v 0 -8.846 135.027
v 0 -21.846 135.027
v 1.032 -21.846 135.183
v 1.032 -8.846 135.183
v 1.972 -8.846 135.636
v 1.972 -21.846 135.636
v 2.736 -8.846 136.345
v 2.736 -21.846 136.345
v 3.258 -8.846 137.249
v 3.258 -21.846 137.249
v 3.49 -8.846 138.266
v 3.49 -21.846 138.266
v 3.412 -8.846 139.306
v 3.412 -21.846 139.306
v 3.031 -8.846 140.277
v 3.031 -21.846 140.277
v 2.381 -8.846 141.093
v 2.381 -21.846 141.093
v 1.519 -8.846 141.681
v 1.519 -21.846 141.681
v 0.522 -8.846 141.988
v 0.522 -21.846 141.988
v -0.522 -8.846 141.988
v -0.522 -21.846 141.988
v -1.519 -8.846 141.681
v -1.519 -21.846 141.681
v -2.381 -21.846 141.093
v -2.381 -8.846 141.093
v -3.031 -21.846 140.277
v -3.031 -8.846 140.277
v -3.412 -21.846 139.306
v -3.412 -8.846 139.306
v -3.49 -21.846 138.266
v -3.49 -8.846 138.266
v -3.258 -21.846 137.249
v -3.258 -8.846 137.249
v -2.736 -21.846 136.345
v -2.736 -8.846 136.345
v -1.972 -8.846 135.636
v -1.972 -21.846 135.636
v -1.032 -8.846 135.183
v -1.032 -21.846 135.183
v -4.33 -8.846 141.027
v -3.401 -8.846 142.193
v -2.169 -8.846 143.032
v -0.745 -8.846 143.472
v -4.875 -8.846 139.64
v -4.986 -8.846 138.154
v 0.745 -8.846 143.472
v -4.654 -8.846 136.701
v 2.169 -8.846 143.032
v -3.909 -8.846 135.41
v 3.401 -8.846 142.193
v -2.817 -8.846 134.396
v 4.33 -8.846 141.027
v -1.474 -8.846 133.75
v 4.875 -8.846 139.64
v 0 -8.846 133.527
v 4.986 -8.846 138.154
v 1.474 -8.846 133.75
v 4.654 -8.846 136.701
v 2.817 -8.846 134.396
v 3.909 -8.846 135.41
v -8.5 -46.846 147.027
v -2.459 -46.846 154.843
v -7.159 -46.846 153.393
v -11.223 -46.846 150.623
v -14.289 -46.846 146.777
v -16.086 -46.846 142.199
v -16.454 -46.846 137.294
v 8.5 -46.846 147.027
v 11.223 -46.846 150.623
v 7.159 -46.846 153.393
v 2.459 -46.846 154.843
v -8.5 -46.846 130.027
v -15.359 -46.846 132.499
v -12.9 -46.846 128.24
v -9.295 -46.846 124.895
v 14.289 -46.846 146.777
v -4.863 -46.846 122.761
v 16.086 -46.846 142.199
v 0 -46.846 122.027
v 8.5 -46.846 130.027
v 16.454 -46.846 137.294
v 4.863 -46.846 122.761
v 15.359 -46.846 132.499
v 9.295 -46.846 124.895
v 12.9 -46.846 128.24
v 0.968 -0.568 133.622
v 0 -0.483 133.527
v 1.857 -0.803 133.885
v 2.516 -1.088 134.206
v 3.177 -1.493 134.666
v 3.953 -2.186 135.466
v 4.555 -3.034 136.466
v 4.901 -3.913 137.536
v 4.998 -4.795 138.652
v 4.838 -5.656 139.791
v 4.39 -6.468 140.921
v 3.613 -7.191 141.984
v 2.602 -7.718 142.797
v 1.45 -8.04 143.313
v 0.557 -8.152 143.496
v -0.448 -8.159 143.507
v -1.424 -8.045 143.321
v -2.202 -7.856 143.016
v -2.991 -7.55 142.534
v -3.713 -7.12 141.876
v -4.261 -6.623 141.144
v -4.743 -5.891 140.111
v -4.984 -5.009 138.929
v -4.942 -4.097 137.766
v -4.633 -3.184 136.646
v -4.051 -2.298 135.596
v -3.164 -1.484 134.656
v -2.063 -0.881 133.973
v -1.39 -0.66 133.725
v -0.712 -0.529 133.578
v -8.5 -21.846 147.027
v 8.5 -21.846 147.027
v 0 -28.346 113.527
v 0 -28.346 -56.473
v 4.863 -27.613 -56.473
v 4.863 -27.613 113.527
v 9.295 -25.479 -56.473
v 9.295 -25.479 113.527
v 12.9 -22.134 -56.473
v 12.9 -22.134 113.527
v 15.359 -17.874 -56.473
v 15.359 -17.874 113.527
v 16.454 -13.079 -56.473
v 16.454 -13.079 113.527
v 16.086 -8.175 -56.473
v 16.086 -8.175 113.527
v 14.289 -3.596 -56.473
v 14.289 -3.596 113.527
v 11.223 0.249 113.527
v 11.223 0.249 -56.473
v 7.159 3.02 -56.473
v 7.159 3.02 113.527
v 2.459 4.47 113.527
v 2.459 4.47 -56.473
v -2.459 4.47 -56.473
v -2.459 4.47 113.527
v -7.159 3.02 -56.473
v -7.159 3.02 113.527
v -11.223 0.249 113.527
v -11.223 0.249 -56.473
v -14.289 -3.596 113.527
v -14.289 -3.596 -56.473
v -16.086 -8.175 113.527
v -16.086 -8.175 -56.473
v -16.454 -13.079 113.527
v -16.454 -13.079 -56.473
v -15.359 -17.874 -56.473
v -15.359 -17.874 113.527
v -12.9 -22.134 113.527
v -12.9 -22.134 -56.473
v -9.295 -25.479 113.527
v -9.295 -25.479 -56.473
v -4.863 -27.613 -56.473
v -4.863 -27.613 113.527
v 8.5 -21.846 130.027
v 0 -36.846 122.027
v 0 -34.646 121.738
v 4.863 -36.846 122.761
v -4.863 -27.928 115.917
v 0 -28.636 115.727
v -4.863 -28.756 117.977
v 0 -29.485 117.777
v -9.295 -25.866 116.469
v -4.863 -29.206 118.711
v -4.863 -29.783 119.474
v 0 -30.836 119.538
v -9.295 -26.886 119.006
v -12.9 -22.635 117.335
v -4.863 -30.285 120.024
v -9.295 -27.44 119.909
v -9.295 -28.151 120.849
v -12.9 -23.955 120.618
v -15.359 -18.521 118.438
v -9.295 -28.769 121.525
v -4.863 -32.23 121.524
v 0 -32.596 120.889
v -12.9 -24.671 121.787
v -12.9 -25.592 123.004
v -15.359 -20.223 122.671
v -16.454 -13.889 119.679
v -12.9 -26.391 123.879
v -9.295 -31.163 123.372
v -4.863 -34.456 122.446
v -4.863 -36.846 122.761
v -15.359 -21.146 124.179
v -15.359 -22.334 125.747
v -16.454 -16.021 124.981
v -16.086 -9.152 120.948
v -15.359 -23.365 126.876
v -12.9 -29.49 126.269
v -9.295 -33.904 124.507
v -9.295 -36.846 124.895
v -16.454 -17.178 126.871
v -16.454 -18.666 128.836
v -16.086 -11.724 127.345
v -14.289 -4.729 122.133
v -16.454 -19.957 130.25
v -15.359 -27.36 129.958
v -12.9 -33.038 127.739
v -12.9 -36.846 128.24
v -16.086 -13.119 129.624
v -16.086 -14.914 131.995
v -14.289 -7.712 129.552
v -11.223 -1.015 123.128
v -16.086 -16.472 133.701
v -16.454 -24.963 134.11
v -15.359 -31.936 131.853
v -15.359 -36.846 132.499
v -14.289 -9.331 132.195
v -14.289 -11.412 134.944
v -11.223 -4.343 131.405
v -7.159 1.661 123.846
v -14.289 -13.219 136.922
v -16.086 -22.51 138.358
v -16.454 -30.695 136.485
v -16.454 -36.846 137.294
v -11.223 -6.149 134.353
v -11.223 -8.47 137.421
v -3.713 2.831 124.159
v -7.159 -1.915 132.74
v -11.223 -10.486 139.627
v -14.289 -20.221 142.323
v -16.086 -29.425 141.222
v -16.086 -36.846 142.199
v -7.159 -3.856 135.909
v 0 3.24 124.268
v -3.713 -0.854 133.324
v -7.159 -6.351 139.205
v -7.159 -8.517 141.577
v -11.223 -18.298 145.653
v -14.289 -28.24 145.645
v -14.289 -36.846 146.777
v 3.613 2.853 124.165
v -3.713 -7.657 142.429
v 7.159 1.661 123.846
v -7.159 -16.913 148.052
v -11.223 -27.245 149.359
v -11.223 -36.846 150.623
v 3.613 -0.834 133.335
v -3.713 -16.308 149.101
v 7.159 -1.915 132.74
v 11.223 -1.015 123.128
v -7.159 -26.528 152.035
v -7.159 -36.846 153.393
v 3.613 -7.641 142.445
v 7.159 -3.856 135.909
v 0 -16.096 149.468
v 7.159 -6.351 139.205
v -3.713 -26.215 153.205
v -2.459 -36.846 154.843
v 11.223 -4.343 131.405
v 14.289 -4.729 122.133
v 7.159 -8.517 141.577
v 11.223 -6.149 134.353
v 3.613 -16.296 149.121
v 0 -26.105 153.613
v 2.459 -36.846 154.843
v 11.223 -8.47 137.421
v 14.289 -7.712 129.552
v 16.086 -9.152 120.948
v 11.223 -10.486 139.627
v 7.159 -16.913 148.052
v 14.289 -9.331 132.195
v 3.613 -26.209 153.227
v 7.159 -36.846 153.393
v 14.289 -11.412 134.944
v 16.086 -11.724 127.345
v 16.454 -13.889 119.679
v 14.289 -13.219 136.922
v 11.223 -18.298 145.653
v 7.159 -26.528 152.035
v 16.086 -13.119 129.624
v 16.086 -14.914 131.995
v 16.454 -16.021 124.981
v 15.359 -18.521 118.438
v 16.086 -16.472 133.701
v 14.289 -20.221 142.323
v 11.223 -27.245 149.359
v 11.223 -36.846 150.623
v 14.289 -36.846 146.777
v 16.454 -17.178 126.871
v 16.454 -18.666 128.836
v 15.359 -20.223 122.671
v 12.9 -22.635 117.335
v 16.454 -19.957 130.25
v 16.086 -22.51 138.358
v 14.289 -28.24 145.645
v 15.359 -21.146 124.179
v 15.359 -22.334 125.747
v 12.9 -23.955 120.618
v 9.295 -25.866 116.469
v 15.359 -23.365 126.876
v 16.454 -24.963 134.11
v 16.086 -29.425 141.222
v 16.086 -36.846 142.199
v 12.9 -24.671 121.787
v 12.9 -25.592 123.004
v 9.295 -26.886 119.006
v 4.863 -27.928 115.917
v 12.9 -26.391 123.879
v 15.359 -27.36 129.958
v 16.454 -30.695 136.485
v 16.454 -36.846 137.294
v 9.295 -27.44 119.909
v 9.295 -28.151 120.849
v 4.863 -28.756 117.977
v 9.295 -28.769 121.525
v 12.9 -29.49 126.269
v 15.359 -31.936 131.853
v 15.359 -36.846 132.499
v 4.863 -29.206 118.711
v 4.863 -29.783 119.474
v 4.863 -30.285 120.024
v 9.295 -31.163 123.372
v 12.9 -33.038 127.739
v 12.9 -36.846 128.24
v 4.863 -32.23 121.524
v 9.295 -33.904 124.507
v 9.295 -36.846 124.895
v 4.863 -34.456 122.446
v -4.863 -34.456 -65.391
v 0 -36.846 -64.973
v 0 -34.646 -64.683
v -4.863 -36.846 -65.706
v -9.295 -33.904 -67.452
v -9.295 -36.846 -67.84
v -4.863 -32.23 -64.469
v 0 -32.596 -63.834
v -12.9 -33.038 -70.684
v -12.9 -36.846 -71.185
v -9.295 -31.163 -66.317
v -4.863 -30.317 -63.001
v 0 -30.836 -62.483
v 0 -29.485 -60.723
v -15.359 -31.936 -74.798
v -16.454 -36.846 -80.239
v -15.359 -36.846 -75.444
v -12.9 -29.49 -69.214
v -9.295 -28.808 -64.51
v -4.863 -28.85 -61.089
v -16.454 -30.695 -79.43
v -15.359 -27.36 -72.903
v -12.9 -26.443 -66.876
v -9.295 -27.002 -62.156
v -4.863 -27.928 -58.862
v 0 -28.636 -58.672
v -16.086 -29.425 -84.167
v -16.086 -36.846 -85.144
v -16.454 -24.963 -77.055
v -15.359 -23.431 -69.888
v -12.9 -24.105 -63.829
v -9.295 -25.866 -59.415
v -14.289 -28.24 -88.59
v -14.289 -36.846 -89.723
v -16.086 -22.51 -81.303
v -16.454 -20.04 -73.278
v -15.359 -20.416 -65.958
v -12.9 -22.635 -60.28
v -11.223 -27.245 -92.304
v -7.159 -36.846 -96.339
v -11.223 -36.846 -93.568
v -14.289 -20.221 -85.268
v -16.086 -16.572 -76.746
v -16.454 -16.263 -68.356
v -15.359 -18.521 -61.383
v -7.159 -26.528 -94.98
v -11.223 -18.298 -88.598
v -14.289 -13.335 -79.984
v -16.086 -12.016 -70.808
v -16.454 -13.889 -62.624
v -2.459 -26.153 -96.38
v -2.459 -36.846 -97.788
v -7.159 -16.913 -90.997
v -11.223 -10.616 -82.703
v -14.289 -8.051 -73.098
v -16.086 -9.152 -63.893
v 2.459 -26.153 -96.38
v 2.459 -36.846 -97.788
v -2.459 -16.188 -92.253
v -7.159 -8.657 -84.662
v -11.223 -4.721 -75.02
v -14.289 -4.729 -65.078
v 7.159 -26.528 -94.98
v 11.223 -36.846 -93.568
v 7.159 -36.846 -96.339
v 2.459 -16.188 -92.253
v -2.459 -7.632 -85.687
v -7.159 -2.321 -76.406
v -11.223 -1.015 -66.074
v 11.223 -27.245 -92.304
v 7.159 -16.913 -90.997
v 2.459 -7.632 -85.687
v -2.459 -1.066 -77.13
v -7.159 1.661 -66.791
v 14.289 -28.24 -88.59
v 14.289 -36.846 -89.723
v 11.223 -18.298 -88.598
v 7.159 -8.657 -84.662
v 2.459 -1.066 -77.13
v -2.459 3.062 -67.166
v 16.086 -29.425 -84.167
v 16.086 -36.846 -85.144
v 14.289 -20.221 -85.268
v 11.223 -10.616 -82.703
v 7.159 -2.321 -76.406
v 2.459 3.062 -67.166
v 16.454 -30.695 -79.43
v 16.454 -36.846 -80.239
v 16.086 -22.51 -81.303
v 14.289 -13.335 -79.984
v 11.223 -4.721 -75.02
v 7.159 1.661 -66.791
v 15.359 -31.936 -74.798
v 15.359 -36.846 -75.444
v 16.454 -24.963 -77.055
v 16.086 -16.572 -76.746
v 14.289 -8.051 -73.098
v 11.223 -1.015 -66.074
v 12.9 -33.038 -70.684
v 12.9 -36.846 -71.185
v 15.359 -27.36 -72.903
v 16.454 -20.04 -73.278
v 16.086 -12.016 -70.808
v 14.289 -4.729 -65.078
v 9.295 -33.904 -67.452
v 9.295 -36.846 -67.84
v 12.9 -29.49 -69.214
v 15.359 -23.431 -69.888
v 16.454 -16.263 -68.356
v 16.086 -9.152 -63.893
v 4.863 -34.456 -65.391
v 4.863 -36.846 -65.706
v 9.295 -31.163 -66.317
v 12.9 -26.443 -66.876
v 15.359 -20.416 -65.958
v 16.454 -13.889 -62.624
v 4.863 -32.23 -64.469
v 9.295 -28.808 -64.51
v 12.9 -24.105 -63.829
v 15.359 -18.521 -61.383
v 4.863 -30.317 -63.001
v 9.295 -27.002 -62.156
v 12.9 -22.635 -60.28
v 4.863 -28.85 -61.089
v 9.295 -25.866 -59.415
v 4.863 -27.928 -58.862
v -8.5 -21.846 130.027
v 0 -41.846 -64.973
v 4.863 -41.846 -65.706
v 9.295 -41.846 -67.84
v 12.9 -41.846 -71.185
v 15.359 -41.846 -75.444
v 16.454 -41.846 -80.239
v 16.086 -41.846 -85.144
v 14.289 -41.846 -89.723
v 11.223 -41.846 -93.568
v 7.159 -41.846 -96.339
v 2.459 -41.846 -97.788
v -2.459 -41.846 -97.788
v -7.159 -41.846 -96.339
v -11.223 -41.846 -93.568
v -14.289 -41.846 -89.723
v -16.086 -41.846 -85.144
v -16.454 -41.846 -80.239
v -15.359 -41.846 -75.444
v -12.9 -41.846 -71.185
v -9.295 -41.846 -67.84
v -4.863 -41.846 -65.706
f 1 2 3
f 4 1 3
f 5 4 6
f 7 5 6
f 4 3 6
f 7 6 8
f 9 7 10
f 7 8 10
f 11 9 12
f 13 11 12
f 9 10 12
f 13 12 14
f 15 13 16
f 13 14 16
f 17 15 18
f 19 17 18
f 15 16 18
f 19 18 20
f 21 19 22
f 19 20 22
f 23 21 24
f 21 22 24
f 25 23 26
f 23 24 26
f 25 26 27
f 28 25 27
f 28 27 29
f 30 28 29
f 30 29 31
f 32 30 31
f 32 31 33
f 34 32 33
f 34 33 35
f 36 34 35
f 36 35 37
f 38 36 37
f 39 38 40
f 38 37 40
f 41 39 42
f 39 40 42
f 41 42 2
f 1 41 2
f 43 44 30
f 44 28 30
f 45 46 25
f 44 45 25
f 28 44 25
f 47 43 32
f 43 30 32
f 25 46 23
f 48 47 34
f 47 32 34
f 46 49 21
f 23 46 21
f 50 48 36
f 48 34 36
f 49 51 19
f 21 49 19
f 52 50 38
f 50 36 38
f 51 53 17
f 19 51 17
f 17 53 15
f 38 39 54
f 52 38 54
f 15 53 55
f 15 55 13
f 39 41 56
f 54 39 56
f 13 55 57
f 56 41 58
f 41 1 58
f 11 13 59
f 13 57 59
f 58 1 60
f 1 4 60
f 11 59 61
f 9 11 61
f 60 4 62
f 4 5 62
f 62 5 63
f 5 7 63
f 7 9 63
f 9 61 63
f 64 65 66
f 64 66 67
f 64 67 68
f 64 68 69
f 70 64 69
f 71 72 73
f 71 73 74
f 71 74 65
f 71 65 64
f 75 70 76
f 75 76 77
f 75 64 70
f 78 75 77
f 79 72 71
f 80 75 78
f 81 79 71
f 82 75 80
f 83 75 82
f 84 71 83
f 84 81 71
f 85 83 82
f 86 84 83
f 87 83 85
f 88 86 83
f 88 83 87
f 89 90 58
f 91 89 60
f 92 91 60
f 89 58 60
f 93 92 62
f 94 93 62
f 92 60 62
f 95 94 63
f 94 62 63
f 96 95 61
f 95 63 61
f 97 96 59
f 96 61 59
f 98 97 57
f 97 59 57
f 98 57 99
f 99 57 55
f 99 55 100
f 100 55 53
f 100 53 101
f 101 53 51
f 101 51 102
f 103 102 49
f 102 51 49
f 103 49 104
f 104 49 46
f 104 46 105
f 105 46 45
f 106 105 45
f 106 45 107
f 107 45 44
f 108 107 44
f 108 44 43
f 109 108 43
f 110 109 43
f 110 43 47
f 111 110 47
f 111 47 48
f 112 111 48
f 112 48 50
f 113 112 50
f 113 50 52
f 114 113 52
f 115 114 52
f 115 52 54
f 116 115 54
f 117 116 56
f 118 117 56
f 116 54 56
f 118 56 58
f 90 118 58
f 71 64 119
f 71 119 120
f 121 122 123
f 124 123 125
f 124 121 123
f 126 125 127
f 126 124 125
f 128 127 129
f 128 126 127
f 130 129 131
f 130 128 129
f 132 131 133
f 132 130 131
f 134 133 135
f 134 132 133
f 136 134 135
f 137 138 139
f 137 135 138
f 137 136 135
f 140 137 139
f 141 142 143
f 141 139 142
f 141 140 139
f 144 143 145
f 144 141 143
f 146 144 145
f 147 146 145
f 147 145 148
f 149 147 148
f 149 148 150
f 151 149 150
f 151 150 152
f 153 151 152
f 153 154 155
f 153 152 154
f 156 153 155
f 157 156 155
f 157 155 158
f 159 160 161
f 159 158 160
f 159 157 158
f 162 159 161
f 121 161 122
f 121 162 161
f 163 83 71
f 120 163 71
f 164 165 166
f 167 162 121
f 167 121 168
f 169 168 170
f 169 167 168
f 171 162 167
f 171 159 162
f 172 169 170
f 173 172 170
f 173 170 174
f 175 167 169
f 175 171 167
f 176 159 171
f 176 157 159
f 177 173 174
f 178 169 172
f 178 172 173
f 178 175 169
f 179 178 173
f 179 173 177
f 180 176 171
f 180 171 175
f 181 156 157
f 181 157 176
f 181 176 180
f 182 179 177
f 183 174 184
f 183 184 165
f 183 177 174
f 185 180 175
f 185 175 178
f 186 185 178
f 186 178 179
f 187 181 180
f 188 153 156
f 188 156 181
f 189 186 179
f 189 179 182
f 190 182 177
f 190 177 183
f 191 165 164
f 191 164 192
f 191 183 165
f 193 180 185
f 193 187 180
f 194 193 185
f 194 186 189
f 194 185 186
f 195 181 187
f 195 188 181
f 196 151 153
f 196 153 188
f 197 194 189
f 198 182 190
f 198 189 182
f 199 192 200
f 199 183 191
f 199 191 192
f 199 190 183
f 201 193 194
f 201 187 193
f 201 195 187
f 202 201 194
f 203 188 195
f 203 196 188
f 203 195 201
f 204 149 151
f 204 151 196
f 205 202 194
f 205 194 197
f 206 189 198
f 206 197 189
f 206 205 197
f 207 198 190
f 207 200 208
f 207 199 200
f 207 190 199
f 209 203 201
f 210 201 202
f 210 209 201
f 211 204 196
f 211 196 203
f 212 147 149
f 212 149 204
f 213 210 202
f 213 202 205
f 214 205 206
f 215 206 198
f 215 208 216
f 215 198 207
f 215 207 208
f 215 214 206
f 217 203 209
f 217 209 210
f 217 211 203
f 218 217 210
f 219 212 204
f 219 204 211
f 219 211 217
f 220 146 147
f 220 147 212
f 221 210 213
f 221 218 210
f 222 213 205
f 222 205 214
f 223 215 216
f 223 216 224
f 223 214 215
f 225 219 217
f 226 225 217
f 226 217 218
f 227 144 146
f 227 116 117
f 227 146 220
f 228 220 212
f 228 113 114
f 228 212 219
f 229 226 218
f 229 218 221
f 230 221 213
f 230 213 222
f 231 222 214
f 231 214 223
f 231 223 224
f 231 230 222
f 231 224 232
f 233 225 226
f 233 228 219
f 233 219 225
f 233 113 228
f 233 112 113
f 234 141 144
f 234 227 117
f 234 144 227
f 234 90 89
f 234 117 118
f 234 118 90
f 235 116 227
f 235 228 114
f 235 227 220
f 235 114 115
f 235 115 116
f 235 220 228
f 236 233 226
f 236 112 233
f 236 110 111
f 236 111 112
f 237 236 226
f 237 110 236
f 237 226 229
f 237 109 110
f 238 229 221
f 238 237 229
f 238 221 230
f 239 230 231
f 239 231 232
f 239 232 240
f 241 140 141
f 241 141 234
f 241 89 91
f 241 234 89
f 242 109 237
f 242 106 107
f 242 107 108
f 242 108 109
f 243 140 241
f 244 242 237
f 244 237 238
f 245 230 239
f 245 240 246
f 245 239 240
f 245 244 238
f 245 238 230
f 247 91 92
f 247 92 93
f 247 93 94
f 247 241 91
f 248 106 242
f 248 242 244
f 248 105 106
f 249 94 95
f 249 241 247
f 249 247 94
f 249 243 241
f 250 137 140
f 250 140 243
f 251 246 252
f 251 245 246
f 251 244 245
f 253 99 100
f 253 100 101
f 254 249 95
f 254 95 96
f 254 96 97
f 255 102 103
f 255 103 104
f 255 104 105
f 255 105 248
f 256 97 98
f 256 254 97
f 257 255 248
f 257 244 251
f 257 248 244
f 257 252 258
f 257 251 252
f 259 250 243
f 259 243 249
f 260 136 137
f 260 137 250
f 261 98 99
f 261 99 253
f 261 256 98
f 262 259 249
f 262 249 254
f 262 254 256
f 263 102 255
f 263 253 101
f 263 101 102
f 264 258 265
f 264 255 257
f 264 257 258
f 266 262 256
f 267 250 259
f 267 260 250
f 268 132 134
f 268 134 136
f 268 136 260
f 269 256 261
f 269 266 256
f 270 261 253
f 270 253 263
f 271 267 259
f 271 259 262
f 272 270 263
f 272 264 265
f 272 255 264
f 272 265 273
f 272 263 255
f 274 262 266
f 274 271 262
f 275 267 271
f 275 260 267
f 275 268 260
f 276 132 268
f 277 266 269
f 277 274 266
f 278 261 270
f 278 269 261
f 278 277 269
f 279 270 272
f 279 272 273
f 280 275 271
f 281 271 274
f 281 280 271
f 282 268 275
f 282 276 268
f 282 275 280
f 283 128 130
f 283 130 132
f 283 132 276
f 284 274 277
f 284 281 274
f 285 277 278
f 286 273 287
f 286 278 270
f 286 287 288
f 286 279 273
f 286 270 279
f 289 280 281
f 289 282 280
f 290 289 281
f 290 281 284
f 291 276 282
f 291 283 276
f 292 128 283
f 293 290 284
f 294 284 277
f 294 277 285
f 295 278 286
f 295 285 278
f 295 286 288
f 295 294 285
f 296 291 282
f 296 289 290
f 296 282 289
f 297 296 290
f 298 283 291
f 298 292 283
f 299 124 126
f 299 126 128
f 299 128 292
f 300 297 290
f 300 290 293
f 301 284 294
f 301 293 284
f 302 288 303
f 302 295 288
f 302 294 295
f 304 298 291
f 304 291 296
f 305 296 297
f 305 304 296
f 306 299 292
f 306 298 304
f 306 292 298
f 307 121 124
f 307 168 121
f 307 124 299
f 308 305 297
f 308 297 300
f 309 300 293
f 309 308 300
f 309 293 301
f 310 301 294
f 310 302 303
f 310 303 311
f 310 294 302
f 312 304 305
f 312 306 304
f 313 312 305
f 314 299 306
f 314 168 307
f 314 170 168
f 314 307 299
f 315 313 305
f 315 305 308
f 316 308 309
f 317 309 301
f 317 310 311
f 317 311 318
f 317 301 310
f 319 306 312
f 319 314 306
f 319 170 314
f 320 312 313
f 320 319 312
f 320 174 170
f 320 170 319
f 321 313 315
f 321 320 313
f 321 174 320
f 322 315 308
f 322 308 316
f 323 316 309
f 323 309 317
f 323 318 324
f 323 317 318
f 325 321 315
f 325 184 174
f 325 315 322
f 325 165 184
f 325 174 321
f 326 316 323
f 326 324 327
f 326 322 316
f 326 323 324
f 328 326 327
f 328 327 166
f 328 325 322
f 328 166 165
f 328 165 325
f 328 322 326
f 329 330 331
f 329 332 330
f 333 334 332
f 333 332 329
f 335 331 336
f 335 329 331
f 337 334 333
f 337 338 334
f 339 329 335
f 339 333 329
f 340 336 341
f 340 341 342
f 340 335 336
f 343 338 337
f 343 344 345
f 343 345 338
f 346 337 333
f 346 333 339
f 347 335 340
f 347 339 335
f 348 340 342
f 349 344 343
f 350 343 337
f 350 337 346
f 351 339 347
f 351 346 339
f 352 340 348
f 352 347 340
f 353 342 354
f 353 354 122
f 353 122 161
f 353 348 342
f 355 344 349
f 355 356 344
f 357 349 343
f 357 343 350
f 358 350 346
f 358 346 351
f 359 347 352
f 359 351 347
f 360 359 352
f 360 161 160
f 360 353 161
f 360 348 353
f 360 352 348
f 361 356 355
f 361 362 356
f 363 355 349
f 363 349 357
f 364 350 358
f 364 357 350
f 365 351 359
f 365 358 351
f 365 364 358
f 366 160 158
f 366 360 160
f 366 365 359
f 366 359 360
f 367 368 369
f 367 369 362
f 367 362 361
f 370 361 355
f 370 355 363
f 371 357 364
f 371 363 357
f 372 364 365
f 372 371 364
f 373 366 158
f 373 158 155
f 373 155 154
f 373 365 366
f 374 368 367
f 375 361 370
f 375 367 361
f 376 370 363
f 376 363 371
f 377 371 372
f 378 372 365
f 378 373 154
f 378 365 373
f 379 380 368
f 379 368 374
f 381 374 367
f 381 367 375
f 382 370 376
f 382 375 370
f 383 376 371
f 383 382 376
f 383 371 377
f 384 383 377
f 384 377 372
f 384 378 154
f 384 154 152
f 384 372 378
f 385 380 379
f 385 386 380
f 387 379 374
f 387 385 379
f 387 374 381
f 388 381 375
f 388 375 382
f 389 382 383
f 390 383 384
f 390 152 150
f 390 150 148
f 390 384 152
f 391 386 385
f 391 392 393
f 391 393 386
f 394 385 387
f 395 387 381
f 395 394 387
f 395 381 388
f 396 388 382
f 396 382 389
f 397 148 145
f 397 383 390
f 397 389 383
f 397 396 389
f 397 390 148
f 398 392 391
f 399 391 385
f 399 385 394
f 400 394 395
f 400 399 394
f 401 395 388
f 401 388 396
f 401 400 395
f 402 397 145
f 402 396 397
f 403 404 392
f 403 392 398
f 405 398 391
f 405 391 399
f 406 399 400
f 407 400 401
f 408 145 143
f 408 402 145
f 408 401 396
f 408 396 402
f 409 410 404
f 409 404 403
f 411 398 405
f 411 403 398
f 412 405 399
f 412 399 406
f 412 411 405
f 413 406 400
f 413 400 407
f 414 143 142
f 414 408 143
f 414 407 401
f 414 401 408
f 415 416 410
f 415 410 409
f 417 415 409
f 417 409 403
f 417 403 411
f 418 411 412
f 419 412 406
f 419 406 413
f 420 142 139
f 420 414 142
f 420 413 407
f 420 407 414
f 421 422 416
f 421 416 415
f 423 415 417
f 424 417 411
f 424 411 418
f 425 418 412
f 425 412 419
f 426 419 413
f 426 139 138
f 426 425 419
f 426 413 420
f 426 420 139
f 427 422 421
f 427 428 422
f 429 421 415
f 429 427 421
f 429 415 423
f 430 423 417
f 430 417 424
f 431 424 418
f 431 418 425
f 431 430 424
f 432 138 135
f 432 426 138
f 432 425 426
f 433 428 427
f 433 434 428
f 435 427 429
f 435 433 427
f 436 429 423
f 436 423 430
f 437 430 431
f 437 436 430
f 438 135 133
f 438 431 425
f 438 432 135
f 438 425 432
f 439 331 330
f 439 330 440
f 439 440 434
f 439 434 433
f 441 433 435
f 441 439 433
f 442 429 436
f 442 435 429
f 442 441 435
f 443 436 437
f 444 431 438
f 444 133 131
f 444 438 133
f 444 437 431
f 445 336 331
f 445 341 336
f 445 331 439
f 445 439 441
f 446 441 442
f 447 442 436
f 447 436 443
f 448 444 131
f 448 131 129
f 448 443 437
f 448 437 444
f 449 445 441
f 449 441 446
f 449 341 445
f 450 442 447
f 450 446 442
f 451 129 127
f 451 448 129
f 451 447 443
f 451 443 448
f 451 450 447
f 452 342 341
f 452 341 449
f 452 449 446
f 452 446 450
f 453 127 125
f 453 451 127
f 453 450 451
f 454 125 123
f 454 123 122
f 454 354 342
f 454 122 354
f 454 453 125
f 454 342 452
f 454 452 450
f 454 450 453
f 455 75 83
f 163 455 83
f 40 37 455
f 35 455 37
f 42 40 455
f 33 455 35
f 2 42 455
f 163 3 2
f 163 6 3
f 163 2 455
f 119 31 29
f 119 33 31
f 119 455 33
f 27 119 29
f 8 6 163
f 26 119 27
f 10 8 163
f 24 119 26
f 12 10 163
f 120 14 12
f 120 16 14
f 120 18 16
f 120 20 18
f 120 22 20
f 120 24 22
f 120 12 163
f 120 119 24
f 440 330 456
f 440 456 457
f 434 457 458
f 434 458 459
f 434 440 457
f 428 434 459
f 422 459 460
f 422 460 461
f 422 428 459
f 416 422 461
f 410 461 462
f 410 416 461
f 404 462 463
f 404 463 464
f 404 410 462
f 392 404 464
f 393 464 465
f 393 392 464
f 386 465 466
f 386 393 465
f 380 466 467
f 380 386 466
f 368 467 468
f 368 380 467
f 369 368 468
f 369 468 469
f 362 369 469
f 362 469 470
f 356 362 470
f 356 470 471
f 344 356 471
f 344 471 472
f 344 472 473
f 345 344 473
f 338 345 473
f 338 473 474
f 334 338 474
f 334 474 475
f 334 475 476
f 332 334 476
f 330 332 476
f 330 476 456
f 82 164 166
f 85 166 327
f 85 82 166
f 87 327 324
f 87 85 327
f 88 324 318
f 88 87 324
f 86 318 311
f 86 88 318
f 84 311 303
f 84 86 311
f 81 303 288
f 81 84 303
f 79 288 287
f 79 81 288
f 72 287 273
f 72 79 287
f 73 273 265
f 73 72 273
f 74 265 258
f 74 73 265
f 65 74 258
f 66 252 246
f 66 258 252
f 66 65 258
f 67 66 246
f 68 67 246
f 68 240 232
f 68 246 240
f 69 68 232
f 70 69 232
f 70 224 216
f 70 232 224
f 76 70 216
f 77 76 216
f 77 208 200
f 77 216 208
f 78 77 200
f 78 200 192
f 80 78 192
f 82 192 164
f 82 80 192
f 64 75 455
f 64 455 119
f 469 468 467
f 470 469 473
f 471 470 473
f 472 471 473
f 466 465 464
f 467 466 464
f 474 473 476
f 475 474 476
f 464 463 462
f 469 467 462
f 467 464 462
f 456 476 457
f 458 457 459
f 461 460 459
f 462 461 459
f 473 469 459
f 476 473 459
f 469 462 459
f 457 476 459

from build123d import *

# Parameters (mm, degrees)
SWEEP1_PROFILE_R   = 16.5
SKETCH10_W         = 17
SKETCH10_H         = 17
CUT_EXTRUDE1_DEPTH = 25
SKETCH11_R         = 3.5
CUT_EXTRUDE2_DEPTH = 13
SKETCH12_R         = 5
CUT_EXTRUDE3_DEPTH = 13


with BuildPart() as part:
    # Sweep1: sweep along a path in Sketch1
    with BuildLine(Plane(origin=(0, 0, 0), x_dir=(0, 0, -1), z_dir=(1, 0, 0))) as sweep1_path:
        Line((81.472527473, -41.846153846), (81.472527473, -36.846153846))
        ThreePointArc((81.472527473, -36.846153846), (74.150197002, -19.168484316), (56.472527473, -11.846153846))
        Line((56.472527473, -11.846153846), (-113.527472527, -11.846153846))
        ThreePointArc((-113.527472527, -11.846153846), (-131.205142057, -19.168484316), (-138.527472527, -36.846153846))
        Line((-138.527472527, -36.846153846), (-138.527472527, -46.846153846))
    # Sweep1 profile (on start of the path) → Sweep1 (sweep)
    with BuildSketch(Plane(origin=(0, -41.846153846, -81.472527473), x_dir=(0, 0, 1), z_dir=(0, 1, 0))):
        Circle(SWEEP1_PROFILE_R)
    sweep(path=sweep1_path.line)

    # Sketch10 → Cut-Extrude1 (cut)
    with BuildSketch(Plane.XZ.offset(46.846153846)):
        with Locations((0, 138.527472527)):
            Rectangle(SKETCH10_W, SKETCH10_H)
    extrude(amount=-CUT_EXTRUDE1_DEPTH, mode=Mode.SUBTRACT)

    # Sketch11 → Cut-Extrude2 (cut)
    with BuildSketch(Plane.XZ.offset(21.846153846)):
        with Locations(Location((0, 138.527472527, 0), (0, 0, 270))):
            Circle(SKETCH11_R)
    extrude(amount=-CUT_EXTRUDE2_DEPTH, mode=Mode.SUBTRACT)

    # Sketch12 → Cut-Extrude3 (cut)
    with BuildSketch(Plane.XZ.offset(8.846153846)):
        with Locations(Location((0, 138.527472527, 0), (0, 0, 270))):
            Circle(SKETCH12_R)
    extrude(amount=-CUT_EXTRUDE3_DEPTH, mode=Mode.SUBTRACT)


solid = part.part
